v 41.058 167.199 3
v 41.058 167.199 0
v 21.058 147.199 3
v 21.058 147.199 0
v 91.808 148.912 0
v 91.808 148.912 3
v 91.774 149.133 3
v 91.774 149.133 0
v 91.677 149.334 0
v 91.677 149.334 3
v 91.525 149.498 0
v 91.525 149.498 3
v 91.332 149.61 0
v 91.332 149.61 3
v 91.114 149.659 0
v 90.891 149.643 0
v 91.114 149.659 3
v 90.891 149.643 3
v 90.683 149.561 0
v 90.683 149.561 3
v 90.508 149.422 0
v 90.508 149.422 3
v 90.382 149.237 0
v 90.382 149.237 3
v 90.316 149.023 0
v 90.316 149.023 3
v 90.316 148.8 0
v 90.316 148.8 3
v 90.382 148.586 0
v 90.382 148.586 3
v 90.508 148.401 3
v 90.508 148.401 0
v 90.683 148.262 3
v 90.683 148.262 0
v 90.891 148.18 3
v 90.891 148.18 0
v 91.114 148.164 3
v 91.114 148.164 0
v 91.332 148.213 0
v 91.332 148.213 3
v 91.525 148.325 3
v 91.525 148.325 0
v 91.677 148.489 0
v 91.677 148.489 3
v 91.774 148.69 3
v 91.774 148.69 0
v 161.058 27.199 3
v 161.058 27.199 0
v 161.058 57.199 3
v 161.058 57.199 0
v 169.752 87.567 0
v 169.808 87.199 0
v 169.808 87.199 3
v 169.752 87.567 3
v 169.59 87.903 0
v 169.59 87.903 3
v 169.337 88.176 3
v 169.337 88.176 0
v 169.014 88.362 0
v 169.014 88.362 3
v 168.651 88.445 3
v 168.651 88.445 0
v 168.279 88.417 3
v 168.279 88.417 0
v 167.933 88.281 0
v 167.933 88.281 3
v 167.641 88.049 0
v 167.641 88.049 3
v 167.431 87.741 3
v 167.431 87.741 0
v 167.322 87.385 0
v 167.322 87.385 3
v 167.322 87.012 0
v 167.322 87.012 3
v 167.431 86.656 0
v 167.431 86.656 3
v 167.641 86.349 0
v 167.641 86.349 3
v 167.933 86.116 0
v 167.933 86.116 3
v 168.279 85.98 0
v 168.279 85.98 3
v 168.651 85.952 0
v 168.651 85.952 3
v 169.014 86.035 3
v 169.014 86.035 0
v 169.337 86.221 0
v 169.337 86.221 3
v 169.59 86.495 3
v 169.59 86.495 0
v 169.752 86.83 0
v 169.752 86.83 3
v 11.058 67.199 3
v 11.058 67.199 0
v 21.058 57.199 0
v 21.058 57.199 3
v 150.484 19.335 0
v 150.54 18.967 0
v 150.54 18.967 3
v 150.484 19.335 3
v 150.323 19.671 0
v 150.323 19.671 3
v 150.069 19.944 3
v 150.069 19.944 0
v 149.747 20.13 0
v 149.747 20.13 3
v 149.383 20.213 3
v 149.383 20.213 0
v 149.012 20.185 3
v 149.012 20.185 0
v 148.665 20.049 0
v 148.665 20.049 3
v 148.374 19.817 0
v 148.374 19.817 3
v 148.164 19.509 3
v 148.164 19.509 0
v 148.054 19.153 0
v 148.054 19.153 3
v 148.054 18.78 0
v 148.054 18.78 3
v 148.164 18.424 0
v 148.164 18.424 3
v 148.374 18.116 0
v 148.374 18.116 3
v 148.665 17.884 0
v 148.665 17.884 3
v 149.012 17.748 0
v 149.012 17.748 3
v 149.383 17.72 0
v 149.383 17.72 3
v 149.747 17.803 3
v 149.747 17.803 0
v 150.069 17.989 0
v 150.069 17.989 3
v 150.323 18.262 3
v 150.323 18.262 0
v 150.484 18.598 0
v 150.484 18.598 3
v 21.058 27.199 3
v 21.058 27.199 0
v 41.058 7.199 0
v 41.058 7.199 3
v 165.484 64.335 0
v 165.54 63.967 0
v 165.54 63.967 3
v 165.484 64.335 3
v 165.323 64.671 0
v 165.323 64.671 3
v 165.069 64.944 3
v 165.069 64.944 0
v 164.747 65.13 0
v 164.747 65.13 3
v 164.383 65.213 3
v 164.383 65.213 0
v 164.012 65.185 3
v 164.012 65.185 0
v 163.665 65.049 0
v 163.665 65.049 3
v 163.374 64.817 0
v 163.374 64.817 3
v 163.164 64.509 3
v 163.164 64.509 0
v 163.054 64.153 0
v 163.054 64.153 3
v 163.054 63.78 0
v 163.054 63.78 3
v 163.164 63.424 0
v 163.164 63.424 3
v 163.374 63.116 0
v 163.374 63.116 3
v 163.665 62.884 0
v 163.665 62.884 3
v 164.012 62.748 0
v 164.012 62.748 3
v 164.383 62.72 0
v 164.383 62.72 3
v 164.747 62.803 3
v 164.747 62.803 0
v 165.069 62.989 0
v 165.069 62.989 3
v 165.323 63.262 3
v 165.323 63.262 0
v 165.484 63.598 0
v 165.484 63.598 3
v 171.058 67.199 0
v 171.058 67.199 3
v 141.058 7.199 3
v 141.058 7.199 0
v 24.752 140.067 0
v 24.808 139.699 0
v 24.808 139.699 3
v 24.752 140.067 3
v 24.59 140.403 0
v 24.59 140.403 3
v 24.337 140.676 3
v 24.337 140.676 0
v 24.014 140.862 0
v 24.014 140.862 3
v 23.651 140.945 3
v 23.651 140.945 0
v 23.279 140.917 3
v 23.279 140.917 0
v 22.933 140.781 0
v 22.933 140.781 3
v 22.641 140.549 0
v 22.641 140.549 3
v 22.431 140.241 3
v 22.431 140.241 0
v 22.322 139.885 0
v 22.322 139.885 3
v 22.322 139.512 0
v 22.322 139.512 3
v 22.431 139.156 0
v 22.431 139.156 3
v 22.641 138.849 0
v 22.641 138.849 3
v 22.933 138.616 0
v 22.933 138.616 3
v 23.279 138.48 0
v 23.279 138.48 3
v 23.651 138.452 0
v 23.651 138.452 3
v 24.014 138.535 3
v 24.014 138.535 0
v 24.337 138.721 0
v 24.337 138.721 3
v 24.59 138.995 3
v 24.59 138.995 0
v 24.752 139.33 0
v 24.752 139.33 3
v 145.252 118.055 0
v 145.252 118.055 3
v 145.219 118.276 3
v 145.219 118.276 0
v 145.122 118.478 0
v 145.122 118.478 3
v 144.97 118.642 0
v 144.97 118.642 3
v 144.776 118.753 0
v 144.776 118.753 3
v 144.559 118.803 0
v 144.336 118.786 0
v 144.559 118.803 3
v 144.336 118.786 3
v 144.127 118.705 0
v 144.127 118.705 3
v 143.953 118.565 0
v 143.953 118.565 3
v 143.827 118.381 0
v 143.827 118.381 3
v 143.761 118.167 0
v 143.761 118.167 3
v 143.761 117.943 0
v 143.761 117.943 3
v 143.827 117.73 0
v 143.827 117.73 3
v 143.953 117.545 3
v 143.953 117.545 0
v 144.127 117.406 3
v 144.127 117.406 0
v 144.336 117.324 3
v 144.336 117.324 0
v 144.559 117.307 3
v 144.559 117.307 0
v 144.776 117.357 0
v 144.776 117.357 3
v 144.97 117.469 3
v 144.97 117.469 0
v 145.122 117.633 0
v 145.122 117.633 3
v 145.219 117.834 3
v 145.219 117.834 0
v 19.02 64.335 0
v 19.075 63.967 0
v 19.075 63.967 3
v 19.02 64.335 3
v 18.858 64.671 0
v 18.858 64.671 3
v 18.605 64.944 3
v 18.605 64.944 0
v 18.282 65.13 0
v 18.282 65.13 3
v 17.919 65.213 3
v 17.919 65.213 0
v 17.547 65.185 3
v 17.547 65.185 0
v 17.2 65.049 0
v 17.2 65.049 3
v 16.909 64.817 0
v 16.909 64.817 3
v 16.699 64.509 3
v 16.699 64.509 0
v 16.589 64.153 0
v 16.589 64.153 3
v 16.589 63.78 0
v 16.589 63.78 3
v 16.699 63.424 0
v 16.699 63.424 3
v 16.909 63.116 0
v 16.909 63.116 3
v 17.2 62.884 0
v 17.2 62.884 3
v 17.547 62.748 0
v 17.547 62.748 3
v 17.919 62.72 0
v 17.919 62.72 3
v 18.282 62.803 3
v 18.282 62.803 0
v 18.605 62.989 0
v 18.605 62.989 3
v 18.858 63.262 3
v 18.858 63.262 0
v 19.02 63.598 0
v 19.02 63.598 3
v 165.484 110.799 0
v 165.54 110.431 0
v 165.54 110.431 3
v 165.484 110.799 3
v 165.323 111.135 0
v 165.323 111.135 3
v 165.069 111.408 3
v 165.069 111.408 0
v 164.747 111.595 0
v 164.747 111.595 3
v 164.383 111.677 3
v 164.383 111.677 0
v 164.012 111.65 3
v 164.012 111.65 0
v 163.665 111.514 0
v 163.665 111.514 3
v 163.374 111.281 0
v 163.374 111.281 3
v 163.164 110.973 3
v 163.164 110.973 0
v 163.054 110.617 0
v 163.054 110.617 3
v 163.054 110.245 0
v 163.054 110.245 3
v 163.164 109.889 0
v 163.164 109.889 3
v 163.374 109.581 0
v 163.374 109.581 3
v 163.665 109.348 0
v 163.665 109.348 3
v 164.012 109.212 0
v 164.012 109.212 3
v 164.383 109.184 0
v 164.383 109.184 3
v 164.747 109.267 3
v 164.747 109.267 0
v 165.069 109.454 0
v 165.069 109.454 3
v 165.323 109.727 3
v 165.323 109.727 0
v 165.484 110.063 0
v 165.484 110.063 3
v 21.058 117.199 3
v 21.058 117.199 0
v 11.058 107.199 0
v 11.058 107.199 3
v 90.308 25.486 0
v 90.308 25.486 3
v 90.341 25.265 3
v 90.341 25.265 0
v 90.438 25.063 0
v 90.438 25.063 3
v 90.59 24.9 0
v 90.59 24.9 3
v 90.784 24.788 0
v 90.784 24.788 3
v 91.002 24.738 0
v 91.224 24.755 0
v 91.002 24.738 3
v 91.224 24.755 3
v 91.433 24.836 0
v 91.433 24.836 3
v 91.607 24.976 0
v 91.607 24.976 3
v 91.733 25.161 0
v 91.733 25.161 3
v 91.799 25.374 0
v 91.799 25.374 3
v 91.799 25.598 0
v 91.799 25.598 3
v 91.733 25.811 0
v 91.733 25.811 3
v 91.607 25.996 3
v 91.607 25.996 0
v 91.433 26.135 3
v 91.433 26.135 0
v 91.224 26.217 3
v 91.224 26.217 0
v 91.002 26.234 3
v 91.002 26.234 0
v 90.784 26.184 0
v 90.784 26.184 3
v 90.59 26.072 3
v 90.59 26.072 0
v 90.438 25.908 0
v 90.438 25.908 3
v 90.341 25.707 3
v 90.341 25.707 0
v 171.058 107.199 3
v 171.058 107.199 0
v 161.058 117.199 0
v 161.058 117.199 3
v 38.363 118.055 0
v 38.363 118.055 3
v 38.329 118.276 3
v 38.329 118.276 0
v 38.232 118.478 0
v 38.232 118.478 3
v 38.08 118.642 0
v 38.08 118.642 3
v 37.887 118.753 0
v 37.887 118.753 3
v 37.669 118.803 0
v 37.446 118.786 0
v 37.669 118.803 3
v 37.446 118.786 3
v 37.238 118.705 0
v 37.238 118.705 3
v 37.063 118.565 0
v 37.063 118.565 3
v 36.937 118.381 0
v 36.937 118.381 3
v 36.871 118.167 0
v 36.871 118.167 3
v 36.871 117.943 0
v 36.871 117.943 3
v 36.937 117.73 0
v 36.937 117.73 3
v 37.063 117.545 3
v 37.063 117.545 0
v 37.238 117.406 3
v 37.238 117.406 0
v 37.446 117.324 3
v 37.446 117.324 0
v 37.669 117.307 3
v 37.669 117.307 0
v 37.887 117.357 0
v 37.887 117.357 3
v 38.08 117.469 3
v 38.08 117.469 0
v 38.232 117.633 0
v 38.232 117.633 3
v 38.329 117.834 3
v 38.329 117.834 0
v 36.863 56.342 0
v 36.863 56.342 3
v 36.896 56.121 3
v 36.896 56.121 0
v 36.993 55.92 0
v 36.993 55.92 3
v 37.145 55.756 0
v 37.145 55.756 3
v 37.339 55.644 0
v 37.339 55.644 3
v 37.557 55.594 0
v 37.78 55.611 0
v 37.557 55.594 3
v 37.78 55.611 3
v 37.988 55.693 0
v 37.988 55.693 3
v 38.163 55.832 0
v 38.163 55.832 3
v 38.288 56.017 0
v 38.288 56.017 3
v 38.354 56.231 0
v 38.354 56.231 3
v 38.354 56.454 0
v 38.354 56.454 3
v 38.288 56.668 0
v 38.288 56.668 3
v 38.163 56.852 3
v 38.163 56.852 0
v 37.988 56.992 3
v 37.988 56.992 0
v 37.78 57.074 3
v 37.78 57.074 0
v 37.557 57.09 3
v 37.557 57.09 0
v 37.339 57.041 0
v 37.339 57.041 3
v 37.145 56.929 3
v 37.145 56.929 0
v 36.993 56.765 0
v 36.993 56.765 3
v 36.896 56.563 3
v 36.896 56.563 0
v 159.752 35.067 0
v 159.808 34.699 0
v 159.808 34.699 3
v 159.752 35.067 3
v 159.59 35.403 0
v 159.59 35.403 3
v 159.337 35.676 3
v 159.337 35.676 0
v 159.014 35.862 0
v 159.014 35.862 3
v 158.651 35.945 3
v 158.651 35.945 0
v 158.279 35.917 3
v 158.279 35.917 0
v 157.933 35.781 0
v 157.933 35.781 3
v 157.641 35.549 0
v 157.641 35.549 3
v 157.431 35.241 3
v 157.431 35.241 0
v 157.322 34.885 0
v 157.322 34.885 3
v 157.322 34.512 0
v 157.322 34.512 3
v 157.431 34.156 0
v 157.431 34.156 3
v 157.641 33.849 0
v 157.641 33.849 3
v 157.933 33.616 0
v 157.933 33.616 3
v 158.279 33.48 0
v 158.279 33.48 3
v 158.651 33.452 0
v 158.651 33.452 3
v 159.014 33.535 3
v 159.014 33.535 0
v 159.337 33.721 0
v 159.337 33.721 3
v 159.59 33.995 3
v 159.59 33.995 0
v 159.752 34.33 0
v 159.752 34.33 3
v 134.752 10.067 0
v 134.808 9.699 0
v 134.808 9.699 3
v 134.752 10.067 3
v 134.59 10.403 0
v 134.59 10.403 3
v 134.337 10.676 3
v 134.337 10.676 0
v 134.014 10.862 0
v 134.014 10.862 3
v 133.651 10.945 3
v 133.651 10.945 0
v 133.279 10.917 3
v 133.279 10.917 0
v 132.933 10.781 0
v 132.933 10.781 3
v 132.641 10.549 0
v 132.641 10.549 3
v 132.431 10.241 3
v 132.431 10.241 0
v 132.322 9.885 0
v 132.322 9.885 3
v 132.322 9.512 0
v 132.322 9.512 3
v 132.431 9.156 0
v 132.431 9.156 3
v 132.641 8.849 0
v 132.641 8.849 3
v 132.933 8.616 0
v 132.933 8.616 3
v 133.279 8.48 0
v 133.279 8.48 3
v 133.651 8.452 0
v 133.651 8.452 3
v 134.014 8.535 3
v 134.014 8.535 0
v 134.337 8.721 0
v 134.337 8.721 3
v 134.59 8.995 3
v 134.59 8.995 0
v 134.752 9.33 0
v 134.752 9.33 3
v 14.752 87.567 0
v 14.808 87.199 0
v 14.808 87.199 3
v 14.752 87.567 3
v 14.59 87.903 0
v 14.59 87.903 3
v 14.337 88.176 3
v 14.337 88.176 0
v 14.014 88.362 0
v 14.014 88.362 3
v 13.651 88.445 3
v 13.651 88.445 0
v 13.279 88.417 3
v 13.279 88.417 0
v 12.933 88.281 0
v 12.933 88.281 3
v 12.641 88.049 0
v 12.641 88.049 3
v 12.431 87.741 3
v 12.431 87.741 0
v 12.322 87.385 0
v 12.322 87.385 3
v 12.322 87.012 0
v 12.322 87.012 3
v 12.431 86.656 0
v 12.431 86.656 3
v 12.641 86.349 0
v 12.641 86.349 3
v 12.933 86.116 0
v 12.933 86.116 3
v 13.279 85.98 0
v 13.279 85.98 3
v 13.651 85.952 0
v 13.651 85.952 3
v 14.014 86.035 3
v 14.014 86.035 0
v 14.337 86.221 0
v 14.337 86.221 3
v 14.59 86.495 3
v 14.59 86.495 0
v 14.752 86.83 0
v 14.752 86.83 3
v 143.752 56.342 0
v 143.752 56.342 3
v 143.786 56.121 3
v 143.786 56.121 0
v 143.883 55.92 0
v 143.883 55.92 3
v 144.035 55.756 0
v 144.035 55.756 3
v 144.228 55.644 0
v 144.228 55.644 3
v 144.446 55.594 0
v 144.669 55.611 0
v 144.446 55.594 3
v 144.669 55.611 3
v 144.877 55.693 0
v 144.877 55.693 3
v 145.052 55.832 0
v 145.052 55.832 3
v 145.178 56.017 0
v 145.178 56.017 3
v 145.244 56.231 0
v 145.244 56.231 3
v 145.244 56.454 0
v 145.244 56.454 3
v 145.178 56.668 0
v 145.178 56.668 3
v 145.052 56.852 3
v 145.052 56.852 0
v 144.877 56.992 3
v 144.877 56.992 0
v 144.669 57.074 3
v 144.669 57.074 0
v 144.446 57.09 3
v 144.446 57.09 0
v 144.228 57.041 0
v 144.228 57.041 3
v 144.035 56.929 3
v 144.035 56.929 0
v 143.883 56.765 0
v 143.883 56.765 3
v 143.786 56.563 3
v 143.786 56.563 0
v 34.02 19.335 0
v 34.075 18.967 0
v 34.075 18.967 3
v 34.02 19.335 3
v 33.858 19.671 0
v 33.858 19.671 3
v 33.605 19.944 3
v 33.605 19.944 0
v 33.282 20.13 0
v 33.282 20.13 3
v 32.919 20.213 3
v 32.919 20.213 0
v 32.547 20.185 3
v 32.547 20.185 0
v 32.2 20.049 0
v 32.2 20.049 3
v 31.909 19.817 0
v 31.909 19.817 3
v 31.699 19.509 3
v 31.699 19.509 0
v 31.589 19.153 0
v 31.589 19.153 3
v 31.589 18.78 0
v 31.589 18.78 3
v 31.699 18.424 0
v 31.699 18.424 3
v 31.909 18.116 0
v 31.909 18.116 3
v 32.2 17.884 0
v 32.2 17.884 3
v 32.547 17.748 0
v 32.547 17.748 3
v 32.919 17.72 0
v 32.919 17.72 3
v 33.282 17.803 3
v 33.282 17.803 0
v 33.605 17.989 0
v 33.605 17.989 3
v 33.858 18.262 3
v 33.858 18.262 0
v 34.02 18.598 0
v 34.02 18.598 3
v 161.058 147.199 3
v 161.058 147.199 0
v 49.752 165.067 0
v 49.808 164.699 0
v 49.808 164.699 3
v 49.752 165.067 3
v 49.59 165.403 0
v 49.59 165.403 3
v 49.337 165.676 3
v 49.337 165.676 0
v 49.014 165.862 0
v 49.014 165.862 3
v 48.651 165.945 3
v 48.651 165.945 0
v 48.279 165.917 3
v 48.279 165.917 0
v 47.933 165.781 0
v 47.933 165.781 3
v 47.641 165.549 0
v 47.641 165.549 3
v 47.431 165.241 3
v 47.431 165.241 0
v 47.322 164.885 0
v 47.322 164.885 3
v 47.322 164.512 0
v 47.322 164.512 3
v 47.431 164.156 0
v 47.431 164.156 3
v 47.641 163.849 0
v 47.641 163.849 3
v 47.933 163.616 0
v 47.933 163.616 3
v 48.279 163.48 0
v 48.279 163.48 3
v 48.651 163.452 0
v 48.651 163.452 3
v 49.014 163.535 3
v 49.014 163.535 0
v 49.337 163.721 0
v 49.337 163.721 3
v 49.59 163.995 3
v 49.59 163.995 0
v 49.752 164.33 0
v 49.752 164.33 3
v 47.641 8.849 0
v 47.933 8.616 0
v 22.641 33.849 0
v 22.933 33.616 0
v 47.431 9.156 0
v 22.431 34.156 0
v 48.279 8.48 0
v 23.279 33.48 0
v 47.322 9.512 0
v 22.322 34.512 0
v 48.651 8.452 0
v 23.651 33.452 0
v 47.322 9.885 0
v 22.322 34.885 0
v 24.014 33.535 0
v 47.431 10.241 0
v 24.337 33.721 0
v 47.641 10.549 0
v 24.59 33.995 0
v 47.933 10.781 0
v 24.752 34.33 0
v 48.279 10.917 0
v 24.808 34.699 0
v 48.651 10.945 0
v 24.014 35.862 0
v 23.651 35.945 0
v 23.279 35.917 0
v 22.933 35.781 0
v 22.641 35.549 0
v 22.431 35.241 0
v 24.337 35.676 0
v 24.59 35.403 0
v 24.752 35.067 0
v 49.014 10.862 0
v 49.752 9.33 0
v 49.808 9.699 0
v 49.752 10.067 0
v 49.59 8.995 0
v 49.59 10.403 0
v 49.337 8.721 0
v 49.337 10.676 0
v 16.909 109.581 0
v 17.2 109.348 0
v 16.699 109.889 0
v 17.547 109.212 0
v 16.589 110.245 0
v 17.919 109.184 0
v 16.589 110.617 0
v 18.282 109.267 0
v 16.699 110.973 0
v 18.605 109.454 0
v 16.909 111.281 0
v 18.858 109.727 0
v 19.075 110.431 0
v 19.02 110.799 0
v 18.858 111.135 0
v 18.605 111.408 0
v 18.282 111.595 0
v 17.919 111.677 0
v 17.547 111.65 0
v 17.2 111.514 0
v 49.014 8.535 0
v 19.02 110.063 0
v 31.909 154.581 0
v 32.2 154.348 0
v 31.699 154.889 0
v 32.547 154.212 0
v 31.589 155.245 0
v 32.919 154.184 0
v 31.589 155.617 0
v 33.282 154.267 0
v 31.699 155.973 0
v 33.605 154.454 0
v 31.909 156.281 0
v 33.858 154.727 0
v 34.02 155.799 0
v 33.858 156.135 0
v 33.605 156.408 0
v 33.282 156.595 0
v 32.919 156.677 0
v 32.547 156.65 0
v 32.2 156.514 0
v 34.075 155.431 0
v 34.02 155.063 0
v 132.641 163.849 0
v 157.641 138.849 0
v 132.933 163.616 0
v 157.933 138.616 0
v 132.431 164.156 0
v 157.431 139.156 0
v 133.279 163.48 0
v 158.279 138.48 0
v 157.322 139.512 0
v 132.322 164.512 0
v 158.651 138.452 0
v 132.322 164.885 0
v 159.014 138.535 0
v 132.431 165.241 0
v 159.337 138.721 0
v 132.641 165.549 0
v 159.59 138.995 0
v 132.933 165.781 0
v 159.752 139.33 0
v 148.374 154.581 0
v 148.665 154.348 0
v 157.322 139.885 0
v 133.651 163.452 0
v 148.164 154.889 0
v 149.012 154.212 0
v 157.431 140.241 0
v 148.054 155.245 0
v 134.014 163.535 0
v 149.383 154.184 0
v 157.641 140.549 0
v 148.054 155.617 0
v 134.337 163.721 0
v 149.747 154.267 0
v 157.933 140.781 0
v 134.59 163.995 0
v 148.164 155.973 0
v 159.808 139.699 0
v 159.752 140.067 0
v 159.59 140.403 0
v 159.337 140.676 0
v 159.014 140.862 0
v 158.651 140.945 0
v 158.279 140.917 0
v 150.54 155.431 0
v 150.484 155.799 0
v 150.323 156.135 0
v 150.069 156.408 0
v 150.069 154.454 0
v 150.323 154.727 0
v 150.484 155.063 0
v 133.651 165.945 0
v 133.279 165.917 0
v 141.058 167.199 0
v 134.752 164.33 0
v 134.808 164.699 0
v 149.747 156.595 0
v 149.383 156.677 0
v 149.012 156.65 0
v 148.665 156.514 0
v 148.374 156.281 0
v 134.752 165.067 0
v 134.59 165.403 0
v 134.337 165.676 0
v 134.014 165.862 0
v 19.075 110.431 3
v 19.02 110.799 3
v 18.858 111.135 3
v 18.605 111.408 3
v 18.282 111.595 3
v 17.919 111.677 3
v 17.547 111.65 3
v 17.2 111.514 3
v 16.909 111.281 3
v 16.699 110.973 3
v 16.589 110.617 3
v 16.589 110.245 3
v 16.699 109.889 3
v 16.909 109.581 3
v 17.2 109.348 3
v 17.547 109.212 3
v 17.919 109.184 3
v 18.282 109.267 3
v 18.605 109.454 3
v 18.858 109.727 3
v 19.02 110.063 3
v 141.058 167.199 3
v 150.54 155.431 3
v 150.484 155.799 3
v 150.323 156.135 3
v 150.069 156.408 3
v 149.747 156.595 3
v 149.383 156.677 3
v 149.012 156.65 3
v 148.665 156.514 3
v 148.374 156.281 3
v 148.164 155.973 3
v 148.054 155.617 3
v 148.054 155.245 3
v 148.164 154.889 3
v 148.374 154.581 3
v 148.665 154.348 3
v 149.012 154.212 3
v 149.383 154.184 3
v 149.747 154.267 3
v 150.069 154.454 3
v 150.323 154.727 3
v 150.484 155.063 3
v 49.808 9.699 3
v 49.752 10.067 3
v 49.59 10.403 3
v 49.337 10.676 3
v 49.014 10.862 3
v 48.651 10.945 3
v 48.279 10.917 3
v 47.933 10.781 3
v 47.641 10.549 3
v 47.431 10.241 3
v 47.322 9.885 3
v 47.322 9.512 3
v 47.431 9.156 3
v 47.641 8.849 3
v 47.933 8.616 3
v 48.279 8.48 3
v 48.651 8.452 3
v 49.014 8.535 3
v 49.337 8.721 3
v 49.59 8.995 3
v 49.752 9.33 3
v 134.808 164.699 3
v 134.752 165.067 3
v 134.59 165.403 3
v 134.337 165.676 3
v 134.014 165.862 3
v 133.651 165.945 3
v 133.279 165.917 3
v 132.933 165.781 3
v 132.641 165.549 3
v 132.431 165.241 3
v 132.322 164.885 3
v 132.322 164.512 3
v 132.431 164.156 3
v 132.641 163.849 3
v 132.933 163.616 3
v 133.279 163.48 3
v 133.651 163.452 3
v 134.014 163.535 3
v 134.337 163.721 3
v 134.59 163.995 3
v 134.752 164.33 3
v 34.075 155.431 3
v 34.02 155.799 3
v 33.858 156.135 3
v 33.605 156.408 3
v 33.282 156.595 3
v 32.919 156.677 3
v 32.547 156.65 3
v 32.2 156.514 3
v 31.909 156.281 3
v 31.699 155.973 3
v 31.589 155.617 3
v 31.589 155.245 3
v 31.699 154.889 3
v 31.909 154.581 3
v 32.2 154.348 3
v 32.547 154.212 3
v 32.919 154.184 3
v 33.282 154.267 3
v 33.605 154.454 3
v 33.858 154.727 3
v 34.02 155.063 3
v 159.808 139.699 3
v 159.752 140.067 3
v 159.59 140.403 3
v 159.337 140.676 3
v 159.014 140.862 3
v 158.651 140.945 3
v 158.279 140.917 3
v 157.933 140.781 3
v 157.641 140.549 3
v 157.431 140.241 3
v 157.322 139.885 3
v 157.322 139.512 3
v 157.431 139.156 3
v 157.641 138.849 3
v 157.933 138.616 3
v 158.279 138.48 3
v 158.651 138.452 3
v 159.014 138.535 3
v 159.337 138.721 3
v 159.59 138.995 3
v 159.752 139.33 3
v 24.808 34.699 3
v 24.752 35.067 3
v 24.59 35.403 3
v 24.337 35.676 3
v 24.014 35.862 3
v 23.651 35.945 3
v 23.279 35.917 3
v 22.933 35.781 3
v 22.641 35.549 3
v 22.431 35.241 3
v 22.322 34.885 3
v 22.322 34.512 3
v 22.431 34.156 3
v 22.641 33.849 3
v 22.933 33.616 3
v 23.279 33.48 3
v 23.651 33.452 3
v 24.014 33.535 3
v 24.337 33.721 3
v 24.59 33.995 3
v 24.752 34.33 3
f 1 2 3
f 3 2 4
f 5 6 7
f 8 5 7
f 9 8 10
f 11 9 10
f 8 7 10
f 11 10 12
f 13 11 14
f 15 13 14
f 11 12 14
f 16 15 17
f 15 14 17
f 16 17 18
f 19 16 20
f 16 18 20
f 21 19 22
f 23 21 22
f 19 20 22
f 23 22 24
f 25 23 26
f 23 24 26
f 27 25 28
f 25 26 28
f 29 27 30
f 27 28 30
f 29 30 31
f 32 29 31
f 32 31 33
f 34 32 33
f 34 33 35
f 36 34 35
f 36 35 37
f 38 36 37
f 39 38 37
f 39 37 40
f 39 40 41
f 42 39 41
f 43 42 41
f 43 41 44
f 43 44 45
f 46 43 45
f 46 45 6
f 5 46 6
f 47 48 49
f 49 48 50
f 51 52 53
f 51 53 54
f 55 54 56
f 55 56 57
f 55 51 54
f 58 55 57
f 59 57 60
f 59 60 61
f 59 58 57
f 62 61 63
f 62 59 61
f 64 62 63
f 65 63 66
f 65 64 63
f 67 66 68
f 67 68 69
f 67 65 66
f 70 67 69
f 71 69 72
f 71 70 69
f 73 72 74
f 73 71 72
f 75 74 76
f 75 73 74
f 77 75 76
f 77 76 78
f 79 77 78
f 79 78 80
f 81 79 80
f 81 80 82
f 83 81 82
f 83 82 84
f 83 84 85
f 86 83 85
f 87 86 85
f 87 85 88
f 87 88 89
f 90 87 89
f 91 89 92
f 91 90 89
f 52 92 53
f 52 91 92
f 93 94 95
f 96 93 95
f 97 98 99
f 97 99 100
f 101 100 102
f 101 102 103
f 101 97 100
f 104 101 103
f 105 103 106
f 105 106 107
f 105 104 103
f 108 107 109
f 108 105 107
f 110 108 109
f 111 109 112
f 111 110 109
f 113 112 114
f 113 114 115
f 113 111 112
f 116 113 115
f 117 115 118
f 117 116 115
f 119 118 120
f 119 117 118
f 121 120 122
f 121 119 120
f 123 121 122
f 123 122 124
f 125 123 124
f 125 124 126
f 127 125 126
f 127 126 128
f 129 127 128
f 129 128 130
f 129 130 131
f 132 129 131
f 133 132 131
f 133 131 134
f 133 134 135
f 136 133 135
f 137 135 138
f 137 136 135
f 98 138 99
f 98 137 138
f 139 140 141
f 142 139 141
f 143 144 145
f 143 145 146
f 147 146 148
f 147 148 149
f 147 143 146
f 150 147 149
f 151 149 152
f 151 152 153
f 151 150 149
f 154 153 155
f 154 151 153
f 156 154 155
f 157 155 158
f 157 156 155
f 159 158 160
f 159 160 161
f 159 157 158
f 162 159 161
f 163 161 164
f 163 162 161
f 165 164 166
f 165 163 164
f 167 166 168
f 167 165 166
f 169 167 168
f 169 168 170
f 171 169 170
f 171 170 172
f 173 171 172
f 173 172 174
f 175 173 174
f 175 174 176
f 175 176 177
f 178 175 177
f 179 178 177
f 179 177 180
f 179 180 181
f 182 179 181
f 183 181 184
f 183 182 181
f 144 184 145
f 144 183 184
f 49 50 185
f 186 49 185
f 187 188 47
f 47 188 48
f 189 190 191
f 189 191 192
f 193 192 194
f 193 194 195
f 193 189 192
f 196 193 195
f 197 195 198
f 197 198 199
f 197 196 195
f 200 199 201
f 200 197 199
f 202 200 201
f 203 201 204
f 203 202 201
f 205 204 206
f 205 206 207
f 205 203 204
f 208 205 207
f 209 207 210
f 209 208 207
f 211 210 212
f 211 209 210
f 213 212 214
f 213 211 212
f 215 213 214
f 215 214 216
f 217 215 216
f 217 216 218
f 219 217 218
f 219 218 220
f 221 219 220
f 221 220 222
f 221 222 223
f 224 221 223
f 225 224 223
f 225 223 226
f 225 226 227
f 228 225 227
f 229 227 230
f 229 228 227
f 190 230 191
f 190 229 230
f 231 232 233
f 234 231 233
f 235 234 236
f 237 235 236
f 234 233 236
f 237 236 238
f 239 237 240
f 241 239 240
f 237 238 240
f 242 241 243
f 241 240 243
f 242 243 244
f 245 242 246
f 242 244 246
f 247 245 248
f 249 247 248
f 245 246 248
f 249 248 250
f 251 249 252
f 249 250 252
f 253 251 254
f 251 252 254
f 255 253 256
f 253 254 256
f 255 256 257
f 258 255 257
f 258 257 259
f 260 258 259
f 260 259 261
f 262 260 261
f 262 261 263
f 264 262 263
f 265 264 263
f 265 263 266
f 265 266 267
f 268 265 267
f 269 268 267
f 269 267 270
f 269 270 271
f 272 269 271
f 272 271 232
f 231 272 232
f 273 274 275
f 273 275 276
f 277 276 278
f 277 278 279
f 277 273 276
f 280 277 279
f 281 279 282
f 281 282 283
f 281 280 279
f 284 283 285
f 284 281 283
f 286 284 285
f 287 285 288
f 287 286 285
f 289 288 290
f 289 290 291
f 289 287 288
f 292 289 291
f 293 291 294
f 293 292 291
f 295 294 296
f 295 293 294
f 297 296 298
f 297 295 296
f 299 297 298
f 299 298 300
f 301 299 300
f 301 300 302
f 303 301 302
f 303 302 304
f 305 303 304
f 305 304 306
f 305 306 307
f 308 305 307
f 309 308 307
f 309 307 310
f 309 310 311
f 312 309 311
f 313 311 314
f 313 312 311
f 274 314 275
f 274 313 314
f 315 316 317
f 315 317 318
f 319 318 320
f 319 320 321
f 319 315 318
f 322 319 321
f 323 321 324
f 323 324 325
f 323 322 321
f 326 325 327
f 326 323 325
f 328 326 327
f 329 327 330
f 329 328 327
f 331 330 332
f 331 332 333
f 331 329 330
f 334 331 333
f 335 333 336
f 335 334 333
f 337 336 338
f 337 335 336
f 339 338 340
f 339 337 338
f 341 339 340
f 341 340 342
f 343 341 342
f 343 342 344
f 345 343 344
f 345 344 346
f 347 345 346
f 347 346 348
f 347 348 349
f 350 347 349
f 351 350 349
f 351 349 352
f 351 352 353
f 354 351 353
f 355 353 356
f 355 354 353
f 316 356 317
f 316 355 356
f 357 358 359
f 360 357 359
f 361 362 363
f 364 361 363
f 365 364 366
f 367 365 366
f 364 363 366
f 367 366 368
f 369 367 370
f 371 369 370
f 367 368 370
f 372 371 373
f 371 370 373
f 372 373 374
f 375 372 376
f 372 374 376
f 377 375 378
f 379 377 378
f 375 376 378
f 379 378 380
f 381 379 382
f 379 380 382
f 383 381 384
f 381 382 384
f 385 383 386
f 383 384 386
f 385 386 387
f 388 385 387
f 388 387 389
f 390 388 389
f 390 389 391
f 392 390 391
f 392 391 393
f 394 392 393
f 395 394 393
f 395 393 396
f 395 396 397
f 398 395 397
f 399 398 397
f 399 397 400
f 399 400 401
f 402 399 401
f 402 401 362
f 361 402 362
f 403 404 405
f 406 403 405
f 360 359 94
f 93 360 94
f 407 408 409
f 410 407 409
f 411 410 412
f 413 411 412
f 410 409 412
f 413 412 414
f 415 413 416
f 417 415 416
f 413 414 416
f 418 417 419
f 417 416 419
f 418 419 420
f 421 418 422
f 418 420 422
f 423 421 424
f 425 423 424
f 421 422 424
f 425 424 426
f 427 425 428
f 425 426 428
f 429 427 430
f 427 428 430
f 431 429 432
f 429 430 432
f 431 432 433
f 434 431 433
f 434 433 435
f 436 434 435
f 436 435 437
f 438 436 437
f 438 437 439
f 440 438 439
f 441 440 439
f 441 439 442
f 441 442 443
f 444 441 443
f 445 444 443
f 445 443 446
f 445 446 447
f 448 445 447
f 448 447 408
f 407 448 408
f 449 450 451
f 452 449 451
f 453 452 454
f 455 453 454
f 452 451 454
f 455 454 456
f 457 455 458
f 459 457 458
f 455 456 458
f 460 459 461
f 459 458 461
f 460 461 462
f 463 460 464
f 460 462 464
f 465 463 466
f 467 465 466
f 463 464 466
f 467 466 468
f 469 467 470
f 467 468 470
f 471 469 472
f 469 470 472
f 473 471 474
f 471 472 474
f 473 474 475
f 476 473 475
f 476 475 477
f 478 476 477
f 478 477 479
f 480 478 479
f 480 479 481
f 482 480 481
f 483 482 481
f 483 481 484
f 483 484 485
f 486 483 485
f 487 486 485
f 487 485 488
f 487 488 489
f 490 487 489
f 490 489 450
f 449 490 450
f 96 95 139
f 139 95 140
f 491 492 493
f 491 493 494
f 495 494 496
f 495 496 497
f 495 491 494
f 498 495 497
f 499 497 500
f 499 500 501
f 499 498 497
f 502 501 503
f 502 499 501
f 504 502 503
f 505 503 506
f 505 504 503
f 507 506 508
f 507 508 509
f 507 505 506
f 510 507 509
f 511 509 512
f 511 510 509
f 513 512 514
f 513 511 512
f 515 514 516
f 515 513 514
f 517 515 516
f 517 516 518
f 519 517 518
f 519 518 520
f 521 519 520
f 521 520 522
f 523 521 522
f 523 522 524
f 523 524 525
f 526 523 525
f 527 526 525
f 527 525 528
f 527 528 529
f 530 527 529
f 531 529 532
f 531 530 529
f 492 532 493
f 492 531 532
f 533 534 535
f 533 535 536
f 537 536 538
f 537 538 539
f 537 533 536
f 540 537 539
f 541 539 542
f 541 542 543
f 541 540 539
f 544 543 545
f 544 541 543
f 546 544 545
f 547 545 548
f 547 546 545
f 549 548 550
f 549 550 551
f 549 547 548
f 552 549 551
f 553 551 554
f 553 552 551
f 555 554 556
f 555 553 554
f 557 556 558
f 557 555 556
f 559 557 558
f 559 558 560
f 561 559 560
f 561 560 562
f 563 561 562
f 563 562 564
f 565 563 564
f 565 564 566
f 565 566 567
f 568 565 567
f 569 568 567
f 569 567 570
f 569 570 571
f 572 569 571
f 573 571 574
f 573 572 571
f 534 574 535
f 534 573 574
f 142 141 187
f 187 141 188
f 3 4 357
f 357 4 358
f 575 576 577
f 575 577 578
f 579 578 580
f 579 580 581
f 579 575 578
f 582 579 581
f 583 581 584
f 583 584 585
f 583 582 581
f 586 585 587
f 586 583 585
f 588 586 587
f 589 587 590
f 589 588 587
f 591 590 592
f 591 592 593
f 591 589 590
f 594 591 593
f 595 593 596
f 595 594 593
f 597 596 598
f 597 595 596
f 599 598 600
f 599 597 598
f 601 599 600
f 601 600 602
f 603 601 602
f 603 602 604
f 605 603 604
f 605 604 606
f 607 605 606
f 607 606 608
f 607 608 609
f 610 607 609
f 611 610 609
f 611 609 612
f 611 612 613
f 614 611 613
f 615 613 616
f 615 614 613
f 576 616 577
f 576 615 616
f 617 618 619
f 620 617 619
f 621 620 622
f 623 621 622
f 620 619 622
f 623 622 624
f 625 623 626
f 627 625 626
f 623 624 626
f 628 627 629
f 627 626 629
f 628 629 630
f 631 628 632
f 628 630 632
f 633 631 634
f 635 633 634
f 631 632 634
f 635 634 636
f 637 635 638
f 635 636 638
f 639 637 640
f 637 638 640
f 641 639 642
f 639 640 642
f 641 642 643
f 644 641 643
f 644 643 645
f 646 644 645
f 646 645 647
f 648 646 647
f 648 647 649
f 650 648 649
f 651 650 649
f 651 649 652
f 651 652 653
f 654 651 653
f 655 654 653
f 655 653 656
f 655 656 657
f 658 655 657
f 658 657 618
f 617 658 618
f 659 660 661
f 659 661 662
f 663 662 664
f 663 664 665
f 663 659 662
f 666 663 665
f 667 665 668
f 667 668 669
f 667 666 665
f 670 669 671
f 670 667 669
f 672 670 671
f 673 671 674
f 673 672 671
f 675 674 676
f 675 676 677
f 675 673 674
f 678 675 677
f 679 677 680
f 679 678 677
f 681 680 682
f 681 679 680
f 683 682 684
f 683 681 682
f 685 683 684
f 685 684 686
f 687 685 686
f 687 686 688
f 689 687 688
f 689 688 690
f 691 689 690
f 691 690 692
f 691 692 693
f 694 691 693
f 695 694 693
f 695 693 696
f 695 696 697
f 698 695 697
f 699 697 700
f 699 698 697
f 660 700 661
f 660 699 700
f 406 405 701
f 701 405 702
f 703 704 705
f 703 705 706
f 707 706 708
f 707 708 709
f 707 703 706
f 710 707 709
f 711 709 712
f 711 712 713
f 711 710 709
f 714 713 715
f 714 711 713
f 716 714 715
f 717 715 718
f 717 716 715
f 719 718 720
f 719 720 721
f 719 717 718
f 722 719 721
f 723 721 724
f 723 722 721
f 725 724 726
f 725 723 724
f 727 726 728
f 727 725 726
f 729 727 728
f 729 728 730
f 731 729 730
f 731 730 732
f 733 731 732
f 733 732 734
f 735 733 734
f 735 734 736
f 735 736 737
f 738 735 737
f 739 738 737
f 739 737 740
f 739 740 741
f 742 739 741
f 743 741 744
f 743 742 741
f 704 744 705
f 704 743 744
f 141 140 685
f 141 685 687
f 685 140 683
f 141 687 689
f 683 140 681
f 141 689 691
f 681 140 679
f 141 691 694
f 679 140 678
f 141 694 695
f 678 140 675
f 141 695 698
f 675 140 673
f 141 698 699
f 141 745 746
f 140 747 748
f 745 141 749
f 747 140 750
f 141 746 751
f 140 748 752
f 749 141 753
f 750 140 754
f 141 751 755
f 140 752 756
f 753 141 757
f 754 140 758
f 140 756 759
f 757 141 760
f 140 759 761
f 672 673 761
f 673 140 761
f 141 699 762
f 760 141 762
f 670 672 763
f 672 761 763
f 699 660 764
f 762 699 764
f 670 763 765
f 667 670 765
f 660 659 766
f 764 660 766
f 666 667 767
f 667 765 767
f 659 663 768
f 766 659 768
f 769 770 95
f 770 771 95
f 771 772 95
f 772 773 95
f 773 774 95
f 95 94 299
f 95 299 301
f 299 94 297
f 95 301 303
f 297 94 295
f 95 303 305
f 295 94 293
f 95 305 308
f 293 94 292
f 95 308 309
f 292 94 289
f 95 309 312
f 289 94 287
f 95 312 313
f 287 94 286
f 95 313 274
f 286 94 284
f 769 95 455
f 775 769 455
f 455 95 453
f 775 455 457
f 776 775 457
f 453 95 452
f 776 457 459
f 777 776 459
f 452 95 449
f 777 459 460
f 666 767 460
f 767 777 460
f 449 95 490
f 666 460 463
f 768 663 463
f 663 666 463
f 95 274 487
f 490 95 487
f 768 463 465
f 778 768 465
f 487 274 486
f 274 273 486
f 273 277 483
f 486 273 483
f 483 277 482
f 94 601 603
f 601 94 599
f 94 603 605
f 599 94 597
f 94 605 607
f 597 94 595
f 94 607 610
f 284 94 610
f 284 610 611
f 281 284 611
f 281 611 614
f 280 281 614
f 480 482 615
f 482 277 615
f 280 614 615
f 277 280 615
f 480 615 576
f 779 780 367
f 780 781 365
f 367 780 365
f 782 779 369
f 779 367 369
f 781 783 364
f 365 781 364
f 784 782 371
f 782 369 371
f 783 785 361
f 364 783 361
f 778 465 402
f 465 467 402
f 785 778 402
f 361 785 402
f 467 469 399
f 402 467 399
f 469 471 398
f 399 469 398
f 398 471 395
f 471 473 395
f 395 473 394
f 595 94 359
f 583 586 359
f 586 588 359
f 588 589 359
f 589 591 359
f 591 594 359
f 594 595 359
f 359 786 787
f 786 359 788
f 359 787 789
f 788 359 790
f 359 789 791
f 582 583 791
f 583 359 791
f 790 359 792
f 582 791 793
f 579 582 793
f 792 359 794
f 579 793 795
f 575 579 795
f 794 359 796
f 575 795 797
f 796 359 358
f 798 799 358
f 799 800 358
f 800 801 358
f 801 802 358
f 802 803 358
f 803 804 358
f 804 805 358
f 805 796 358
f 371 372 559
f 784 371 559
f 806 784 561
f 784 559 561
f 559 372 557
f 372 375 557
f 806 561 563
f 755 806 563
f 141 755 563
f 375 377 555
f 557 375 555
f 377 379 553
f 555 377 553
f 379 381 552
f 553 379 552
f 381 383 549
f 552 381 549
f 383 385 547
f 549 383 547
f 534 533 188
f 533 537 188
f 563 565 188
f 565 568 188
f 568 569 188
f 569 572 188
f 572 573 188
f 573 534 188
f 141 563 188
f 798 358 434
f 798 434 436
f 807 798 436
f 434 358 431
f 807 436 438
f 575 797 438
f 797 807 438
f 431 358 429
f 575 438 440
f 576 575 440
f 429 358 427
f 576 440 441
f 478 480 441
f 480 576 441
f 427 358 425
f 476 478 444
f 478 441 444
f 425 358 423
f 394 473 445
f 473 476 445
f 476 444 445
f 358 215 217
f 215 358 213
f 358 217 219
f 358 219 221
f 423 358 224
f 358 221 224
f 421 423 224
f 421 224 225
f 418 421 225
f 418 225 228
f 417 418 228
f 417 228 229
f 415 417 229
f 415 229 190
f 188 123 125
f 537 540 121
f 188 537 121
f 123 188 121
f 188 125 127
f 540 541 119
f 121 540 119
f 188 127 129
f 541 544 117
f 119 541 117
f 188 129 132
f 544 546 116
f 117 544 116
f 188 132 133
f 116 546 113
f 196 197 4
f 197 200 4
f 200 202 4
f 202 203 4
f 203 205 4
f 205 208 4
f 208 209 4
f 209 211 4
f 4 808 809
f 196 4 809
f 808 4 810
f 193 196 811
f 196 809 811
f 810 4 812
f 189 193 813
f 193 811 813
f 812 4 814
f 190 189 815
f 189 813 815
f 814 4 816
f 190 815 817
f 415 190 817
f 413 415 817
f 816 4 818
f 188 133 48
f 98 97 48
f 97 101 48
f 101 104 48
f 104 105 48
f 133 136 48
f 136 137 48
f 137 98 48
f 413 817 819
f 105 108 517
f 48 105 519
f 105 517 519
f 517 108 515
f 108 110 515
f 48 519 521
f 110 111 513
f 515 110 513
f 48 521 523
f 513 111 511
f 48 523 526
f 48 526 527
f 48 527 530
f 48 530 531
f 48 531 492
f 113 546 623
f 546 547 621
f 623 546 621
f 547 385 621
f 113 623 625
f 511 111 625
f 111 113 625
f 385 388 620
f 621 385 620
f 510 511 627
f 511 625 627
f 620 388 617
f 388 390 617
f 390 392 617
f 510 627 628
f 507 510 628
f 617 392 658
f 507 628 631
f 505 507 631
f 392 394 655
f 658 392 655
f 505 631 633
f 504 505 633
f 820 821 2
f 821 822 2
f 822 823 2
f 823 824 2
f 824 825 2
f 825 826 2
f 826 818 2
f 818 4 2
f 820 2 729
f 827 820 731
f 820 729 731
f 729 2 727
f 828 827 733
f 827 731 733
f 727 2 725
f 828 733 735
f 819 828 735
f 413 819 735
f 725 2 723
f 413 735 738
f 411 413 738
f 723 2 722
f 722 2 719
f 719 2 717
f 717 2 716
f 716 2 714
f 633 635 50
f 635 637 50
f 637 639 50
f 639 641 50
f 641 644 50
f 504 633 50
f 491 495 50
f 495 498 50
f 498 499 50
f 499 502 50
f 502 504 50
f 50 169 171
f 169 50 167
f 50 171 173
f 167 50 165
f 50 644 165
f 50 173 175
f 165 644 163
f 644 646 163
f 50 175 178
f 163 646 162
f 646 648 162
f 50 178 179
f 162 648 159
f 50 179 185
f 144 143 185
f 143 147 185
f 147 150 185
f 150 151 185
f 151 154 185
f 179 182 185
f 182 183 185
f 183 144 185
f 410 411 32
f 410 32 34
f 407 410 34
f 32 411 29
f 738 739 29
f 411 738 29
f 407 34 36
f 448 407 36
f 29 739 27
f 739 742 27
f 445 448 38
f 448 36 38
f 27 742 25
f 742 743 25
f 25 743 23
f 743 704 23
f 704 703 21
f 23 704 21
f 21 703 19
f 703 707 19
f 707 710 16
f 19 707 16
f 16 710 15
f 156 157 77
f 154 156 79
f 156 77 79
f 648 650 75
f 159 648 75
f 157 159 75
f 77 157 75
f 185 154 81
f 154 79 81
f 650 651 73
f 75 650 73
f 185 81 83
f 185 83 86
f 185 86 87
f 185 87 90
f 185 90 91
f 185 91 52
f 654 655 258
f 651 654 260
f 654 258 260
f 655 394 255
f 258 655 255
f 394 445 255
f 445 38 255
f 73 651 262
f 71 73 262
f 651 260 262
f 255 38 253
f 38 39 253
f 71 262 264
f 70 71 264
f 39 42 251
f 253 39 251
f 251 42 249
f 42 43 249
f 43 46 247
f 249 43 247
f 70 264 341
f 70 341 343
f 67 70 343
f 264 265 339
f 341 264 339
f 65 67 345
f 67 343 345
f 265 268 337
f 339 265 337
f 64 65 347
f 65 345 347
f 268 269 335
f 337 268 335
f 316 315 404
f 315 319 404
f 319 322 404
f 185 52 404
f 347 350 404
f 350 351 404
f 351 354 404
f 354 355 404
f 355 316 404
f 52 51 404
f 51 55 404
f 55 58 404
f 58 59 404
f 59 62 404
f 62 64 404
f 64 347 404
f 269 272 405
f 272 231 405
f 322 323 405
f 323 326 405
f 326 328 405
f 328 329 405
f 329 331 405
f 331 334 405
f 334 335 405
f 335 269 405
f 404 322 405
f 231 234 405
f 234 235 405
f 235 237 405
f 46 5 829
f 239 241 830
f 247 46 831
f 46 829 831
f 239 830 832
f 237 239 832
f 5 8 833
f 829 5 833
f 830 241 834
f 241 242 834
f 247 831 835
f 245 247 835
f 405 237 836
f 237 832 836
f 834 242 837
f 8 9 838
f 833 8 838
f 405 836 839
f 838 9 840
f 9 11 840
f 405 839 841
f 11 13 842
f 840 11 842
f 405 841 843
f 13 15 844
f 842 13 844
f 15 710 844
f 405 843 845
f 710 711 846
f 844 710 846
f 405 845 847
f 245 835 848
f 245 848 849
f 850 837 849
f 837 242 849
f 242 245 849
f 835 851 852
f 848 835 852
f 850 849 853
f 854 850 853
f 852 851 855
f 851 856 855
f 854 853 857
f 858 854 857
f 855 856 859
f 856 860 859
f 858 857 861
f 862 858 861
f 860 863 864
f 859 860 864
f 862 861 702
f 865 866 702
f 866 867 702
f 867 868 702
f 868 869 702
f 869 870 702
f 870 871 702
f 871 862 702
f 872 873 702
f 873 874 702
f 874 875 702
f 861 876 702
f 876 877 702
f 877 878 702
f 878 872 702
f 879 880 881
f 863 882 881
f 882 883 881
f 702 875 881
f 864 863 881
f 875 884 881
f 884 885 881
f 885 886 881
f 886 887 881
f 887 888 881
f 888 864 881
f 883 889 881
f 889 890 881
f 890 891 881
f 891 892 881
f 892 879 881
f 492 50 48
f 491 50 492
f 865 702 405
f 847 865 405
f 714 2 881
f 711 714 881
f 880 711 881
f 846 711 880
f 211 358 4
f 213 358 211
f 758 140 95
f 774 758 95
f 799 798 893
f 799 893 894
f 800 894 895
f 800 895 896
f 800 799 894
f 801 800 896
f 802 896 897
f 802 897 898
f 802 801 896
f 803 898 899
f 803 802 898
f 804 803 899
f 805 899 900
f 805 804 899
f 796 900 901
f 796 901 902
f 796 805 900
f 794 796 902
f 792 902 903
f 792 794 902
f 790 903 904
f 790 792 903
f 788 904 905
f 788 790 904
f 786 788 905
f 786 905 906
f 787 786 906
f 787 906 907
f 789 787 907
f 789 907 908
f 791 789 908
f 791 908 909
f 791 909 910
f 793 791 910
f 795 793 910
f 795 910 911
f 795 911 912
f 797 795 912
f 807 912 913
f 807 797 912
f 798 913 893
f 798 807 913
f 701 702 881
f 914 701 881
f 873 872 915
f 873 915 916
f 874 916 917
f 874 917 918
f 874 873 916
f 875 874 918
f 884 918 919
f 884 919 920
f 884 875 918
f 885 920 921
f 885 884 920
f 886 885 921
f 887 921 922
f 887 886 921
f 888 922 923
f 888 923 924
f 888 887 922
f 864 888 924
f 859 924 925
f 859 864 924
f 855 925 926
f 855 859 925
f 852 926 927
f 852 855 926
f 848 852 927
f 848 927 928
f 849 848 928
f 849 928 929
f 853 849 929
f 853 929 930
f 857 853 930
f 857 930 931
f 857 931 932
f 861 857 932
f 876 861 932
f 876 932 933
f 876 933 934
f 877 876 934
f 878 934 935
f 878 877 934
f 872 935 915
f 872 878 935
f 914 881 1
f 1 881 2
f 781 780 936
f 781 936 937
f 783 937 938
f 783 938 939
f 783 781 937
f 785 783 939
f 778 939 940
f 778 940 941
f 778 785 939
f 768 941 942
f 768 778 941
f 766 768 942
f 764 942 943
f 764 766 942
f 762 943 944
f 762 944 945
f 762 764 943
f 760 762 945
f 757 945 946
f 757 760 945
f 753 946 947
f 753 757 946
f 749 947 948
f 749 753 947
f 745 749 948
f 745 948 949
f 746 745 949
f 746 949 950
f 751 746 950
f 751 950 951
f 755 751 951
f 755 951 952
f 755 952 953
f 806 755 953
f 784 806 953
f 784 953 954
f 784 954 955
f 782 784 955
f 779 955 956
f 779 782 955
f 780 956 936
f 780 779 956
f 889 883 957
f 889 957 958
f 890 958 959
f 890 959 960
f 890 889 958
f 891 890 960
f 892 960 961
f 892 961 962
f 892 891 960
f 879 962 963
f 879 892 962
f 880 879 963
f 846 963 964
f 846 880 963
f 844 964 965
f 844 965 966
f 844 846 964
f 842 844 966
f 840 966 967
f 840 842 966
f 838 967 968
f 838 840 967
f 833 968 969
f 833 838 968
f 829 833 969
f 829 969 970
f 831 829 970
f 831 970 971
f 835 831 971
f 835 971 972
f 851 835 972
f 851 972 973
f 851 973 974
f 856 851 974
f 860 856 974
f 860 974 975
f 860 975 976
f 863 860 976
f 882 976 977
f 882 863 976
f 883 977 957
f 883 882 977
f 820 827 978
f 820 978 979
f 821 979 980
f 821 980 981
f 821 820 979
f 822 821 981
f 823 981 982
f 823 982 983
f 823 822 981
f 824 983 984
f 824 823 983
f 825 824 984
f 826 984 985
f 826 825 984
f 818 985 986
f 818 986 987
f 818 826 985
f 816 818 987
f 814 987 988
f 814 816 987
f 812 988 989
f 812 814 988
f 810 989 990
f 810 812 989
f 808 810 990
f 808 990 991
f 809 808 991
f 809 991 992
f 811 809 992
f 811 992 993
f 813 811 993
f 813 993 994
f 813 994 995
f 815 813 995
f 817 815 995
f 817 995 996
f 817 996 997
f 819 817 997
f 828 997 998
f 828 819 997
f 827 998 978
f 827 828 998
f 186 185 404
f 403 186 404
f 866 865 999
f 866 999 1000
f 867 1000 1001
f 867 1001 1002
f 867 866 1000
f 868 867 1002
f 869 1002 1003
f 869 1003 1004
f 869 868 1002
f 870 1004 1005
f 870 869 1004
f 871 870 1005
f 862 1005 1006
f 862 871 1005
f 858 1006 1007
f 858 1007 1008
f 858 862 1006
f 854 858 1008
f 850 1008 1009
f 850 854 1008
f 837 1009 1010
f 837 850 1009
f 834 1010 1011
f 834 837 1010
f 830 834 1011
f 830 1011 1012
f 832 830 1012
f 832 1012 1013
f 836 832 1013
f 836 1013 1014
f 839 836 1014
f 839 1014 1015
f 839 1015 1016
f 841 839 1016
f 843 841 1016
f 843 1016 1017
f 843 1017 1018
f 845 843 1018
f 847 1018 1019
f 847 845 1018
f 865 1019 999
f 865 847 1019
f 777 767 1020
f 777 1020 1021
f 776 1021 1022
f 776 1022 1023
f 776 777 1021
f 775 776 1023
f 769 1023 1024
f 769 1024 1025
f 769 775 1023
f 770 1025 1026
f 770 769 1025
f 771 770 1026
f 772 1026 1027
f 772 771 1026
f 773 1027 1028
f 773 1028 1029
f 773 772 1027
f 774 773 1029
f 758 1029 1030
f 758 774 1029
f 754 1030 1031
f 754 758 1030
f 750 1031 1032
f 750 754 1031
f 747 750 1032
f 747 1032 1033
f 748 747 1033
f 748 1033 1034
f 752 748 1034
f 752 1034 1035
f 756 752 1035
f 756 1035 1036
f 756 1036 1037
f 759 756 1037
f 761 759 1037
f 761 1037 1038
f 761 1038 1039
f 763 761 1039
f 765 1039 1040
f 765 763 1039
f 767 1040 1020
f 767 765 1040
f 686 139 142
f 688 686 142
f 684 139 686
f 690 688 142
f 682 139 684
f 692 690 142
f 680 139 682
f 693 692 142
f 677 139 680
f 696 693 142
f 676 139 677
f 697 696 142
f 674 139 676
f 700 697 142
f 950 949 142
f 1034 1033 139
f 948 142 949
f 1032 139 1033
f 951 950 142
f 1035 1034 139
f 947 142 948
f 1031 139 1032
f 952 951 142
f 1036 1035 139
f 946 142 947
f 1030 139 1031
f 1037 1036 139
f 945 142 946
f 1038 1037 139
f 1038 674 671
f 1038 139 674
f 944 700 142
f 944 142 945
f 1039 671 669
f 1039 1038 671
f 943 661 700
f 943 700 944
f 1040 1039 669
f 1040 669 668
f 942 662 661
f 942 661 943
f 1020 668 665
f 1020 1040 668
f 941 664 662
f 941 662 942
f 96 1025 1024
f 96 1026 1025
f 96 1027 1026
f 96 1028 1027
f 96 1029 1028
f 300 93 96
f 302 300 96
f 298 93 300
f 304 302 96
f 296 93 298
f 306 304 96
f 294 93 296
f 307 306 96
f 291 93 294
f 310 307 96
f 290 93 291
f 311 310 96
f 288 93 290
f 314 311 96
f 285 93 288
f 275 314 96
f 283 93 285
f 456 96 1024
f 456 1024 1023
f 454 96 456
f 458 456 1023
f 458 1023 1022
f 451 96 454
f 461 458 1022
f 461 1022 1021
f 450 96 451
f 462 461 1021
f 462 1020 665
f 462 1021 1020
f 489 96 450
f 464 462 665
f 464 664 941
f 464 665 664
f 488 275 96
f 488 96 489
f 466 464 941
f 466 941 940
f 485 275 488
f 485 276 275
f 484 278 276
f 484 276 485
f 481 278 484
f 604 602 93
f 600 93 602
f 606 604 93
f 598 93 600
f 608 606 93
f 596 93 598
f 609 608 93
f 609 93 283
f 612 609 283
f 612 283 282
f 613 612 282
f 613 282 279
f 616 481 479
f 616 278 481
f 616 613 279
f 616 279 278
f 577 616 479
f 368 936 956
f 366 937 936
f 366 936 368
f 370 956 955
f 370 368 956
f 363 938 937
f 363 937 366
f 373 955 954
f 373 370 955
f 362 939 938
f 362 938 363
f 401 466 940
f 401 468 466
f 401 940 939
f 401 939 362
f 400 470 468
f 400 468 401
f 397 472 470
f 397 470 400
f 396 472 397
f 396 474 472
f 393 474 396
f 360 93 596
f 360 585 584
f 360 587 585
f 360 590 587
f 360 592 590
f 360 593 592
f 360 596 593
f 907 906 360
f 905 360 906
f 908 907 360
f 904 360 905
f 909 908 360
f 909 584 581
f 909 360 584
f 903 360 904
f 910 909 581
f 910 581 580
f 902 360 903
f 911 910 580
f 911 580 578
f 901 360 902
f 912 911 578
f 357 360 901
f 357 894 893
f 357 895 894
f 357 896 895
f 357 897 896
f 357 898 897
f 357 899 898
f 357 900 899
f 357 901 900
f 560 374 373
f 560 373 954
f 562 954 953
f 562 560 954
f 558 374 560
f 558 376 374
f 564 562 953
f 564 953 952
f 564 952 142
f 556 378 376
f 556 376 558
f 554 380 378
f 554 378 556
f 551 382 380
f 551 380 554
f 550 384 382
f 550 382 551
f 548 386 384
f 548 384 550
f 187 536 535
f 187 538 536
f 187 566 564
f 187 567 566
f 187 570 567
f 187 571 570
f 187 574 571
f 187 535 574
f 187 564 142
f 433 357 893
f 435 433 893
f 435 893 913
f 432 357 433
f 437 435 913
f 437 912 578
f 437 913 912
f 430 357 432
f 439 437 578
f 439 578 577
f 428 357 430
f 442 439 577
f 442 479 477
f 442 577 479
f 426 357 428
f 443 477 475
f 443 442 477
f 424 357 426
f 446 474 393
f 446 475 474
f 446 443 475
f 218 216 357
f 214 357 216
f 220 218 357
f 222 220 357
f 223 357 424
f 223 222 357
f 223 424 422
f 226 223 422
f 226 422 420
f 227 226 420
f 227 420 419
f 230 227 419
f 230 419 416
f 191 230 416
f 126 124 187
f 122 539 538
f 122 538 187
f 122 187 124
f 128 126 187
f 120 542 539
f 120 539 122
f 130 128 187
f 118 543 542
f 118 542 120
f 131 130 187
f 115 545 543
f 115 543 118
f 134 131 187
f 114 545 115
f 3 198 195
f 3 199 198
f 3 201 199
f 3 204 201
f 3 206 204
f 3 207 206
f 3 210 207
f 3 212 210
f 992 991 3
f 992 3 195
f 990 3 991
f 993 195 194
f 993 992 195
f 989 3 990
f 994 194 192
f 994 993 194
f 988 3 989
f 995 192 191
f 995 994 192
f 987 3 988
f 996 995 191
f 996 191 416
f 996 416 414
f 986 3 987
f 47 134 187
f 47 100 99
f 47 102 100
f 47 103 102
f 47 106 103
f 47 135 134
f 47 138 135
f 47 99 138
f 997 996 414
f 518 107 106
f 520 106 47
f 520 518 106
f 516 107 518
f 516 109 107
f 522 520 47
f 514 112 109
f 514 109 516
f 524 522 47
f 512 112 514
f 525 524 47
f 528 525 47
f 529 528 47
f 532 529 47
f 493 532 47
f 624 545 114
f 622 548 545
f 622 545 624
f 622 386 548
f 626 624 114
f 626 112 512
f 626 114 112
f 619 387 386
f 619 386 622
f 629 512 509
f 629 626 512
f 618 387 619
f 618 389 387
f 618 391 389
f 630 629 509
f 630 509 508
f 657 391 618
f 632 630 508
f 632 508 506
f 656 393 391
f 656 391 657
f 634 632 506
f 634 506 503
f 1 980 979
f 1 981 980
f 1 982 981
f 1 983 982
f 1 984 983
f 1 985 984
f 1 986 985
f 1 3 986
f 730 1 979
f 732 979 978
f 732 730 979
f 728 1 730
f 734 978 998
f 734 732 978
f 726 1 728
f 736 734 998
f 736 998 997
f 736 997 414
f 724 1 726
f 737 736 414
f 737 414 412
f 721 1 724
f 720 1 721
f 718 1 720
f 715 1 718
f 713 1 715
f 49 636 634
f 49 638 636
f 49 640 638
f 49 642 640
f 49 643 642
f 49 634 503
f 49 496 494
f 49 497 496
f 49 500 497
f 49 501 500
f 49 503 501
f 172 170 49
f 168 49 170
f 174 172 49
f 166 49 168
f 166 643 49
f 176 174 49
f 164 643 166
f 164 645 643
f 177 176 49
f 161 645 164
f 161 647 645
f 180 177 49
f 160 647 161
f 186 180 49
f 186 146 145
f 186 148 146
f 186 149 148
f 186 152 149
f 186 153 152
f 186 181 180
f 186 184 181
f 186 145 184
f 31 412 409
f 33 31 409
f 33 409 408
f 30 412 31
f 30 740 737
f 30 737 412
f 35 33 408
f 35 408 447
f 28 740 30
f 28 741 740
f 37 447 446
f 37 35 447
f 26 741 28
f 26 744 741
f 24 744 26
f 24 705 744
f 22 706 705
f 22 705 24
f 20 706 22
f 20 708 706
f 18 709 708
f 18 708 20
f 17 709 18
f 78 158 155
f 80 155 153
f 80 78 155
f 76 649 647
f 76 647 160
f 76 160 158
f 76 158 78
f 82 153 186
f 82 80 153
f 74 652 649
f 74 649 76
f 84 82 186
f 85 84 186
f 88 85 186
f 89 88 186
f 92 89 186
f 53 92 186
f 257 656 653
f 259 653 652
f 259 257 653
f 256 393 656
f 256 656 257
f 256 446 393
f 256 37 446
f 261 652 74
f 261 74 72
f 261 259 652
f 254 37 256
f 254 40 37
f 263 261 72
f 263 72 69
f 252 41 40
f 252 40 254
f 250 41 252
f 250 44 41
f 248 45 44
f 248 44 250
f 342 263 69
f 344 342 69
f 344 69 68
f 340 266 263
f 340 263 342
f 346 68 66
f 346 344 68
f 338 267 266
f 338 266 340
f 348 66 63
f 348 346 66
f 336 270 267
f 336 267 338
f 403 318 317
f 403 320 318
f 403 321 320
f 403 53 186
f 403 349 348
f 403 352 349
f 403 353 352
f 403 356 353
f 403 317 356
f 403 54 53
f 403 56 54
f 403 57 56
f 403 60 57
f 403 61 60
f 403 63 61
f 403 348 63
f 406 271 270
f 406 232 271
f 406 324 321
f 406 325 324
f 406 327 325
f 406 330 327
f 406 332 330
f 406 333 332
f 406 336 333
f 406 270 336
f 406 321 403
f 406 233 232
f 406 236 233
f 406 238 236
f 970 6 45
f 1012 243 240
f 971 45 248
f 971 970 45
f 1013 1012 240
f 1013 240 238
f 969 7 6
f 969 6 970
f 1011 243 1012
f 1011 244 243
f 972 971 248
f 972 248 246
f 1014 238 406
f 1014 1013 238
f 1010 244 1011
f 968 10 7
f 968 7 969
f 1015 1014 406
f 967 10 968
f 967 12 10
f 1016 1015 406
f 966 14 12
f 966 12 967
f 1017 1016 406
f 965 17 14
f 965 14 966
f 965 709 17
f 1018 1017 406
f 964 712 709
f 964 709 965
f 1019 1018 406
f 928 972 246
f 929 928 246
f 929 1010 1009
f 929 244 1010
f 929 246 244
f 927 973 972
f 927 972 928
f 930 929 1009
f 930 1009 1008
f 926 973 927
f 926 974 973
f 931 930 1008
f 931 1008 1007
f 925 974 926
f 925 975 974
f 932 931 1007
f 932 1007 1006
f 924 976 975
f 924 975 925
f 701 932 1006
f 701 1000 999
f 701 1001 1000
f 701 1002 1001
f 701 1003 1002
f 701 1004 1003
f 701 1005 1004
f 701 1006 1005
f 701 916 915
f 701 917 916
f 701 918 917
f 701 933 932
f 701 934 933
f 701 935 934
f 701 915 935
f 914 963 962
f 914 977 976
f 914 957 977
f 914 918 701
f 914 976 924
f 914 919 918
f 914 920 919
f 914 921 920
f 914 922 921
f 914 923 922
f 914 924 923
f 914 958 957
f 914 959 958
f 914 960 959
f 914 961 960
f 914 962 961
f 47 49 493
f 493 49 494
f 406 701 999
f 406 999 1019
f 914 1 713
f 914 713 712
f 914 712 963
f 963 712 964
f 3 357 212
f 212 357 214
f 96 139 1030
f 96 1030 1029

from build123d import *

# Parameters (mm, degrees)
MODEL_R             = 1.25
BOSS_EXTRUDE1_DEPTH = 3
SKETCH1_R           = 0.75
CUT_EXTRUDE1_DEPTH  = 10


with BuildPart() as part:
    # Model → Boss-Extrude1 (new body)
    with BuildSketch(Plane.XY):
        Polygon((41.057603072, 7.198758191), (141.057603072, 7.198758191), (161.057603072, 27.198758191), (161.057603072, 57.198758191), (171.057603072, 67.198758191), (171.057603072, 107.198758191), (161.057603072, 117.198758191), (161.057603072, 147.198758191), (141.057603072, 167.198758191), (41.057603072, 167.198758191), (21.057603072, 147.198758191), (21.057603072, 117.198758191), (11.057603072, 107.198758191), (11.057603072, 67.198758191), (21.057603072, 57.198758191), (21.057603072, 27.198758191), align=None)
        with Locations((133.557603072, 9.698758191)):
            Circle(MODEL_R, mode=Mode.SUBTRACT)
        with Locations((158.557603072, 34.698758191)):
            Circle(MODEL_R, mode=Mode.SUBTRACT)
        with Locations((149.289836119, 18.966525144)):
            Circle(MODEL_R, mode=Mode.SUBTRACT)
        with Locations((48.557603072, 9.698758191)):
            Circle(MODEL_R, mode=Mode.SUBTRACT)
        with Locations((23.557603072, 34.698758191)):
            Circle(MODEL_R, mode=Mode.SUBTRACT)
        with Locations((32.825370025, 18.966525144)):
            Circle(MODEL_R, mode=Mode.SUBTRACT)
        with Locations((133.557603072, 164.698758191)):
            Circle(MODEL_R, mode=Mode.SUBTRACT)
        with Locations((158.557603072, 139.698758191)):
            Circle(MODEL_R, mode=Mode.SUBTRACT)
        with Locations((149.289836119, 155.430991238)):
            Circle(MODEL_R, mode=Mode.SUBTRACT)
        with Locations((48.557603072, 164.698758191)):
            Circle(MODEL_R, mode=Mode.SUBTRACT)
        with Locations((23.557603072, 139.698758191)):
            Circle(MODEL_R, mode=Mode.SUBTRACT)
        with Locations((32.825370025, 155.430991238)):
            Circle(MODEL_R, mode=Mode.SUBTRACT)
        with Locations((17.825370025, 63.966525144)):
            Circle(MODEL_R, mode=Mode.SUBTRACT)
        with Locations((13.557603072, 87.198758191)):
            Circle(MODEL_R, mode=Mode.SUBTRACT)
        with Locations((17.825370025, 110.430991238)):
            Circle(MODEL_R, mode=Mode.SUBTRACT)
        with Locations((164.289836119, 63.966525144)):
            Circle(MODEL_R, mode=Mode.SUBTRACT)
        with Locations((168.557603072, 87.198758191)):
            Circle(MODEL_R, mode=Mode.SUBTRACT)
        with Locations((164.289836119, 110.430991238)):
            Circle(MODEL_R, mode=Mode.SUBTRACT)
    extrude(amount=BOSS_EXTRUDE1_DEPTH)

    # Sketch1 → Cut-Extrude1 (cut)
    with BuildSketch(Plane.XY.offset(3)):
        with Locations((91.057603072, 148.911555292)):
            Circle(SKETCH1_R)
        with Locations((37.612753044, 118.055156741)):
            Circle(SKETCH1_R)
        with Locations((144.502453099, 118.055156741)):
            Circle(SKETCH1_R)
        with Locations(Location((144.502453099, 56.342359641, 0), (0, 0, 180))):
            Circle(SKETCH1_R)
        with Locations(Location((91.057603072, 25.485961091, 0), (0, 0, 180))):
            Circle(SKETCH1_R)
        with Locations(Location((37.612753044, 56.342359641, 0), (0, 0, 180))):
            Circle(SKETCH1_R)
    extrude(amount=-CUT_EXTRUDE1_DEPTH, mode=Mode.SUBTRACT)


solid = part.part
